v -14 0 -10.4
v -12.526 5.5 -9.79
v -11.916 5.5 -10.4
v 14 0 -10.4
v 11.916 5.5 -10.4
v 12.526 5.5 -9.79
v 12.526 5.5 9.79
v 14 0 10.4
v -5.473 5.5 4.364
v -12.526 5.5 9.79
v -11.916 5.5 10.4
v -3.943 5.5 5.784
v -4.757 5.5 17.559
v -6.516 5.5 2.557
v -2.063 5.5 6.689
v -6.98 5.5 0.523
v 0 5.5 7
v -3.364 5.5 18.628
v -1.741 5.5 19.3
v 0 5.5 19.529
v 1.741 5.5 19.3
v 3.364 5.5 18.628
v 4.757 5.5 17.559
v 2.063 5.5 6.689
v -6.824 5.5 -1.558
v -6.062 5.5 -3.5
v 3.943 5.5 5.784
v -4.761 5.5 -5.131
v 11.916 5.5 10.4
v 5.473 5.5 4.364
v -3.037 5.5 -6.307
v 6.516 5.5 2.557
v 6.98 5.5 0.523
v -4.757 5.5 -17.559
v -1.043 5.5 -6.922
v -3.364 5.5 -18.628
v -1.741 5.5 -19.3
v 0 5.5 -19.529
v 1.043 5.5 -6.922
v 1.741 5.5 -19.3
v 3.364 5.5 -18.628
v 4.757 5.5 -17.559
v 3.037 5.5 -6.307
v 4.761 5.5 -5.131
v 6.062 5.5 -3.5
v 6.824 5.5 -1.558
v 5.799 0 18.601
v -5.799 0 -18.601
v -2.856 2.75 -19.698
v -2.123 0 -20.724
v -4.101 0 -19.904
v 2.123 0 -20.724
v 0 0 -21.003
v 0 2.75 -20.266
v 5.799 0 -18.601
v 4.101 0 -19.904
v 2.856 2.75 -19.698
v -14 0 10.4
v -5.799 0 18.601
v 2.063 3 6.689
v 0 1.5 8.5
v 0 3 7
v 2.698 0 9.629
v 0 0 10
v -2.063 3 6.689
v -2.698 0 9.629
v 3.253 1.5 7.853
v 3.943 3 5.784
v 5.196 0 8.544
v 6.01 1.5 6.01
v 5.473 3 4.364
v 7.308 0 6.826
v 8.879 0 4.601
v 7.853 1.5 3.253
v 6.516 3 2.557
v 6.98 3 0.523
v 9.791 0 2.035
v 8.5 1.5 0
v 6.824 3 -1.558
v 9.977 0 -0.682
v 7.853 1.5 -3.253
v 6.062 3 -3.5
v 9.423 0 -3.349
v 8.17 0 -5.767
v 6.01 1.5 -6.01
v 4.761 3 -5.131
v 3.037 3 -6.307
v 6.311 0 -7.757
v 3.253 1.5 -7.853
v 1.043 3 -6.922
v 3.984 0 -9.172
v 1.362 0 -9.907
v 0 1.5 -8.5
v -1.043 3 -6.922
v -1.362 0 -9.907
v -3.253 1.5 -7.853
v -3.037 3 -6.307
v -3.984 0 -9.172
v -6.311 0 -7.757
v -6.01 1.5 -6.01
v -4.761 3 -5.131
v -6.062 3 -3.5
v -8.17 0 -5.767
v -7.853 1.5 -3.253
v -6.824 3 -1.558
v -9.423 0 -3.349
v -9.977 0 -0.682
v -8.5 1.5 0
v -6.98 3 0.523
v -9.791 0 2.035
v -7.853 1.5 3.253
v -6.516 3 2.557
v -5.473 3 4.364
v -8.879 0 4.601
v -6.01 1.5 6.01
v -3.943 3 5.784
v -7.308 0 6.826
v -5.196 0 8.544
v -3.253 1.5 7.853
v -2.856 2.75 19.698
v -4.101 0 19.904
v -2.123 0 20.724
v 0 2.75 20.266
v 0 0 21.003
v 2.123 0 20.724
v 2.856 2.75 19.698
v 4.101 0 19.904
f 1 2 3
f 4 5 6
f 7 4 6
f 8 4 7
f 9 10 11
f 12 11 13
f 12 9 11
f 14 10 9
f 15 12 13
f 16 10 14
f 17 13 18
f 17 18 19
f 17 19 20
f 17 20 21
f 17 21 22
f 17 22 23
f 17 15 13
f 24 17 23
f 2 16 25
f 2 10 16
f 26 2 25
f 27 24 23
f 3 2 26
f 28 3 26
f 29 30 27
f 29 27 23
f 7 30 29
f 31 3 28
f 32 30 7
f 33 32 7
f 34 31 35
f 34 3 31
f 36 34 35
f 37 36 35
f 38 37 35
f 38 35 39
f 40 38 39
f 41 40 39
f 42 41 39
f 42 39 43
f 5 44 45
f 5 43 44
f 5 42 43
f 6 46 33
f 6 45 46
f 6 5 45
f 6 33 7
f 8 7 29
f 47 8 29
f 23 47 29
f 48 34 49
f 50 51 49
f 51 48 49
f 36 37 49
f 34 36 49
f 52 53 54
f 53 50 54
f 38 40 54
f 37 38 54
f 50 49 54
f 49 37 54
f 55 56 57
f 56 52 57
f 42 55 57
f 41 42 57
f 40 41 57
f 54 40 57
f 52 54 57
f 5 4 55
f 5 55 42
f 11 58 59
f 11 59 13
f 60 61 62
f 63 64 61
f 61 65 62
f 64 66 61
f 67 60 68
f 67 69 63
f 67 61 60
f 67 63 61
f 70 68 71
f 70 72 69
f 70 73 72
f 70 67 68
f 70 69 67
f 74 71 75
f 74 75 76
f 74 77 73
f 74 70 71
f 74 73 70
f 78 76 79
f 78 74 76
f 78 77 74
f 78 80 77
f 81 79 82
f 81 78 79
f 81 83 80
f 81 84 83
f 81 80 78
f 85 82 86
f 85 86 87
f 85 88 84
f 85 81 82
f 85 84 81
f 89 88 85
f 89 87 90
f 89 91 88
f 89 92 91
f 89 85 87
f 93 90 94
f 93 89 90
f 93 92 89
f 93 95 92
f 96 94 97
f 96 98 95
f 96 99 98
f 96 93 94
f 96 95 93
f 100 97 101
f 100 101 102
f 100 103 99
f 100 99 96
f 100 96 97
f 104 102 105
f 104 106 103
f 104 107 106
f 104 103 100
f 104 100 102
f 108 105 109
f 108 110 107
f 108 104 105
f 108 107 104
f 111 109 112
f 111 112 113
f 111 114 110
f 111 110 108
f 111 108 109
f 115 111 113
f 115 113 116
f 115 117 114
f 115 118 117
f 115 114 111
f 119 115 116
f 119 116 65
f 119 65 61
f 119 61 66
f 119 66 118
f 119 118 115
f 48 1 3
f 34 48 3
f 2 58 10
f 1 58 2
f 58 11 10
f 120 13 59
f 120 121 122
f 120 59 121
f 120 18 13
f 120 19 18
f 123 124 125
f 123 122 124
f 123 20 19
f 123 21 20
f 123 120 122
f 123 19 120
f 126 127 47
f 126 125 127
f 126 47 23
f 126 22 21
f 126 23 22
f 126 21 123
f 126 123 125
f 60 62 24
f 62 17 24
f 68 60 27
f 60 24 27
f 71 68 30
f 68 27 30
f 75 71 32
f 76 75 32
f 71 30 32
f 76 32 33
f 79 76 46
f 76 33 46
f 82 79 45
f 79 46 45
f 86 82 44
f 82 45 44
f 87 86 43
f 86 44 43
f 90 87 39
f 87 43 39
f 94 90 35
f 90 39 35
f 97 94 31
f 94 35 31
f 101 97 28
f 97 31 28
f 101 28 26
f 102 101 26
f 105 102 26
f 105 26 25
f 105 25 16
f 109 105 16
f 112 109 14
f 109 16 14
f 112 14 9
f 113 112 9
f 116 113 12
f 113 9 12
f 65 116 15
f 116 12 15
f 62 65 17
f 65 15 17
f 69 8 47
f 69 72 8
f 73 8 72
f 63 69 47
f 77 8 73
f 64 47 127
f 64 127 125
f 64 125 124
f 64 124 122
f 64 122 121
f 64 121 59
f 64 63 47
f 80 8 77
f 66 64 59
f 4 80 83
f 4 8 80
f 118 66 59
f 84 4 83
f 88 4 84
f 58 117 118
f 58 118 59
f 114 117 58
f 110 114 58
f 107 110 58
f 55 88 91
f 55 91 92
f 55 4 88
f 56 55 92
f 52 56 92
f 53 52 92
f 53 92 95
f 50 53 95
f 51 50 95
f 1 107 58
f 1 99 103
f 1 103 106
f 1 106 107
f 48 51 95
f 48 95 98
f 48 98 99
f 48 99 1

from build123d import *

# Parameters (mm, degrees)
BOSS_EXTRUDE1_DEPTH                            = 5.5
DRAFT1_ANGLE                                   = -15
BOSS_EXTRUDE3_DEPTH                            = 5.5
SKETCH11_W                                     = 36
SKETCH11_H                                     = 45
BOSS_EXTRUDE4_DEPTH                            = 7
SKETCH12_R                                     = 1.65
CUT_EXTRUDE1_DEPTH                             = 10
CSK_FOR_M4_FLAT_HEAD_MACHINE_SCREW1_AT_2_COUNT = 2
CSK_FOR_M4_FLAT_HEAD_MACHINE_SCREW1_AT_2_PITCH = 26
CSK_FOR_M4_FLAT_HEAD_MACHINE_SCREW1_AT_3_COUNT = 2
CSK_FOR_M4_FLAT_HEAD_MACHINE_SCREW1_AT_3_PITCH = 35
CSK_FOR_M4_FLAT_HEAD_MACHINE_SCREW1_AT_4_COUNT = 2
CSK_FOR_M4_FLAT_HEAD_MACHINE_SCREW1_AT_4_PITCH = 43.600458713
FILLET1_R                                      = 5
CHAMFER1_SIZE                                  = 3
CUT_EXTRUDE2_DEPTH                             = 7


with BuildPart() as part:
    # Sketch1 → Boss-Extrude1 (new body)
    with BuildSketch(Plane(origin=(0, 0, 0), x_dir=(1, 0, 0), z_dir=(0, 1, 0))):
        Polygon((-5.798989873, -18.601010127), (-14, -10.4), (-14, 10.4), (-5.798989873, 18.601010127), (5.798989873, 18.601010127), (14, 10.4), (14, -10.4), (5.798989873, -18.601010127), align=None)
    extrude(amount=BOSS_EXTRUDE1_DEPTH)

    # Draft1
    draft1_faces = [part.faces().sort_by_distance(p)[0] for p in [
        (0, 2.75, 18.601010127),
        (-9.899494937, 2.75, 14.500505063),
        (-14, 2.75, 0),
        (9.899494937, 2.75, 14.500505063),
        (-9.899494937, 2.75, -14.500505063),
        (0, 2.75, -18.601010127),
        (9.899494937, 2.75, -14.500505063),
        (14, 2.75, 0),
    ]]
    draft(draft1_faces, Plane(origin=(0, 0, 0), x_dir=(0, 0, -1), z_dir=(0, -1, 0)), DRAFT1_ANGLE)

    # Sketch10 → Boss-Extrude3 (add)
    with BuildSketch(Plane.XZ):
        with BuildLine():
            Line((-14, -10.4), (14, -10.4))
            Line((14, -10.4), (5.798989873, -18.601010127))
            ThreePointArc((5.798989873, -18.601010127), (0, -21.00303038), (-5.798989873, -18.601010127))
            Line((-5.798989873, -18.601010127), (-14, -10.4))
        make_face()
        with BuildLine():
            Line((-14, 10.4), (14, 10.4))
            Line((14, 10.4), (5.798989873, 18.601010127))
            ThreePointArc((5.798989873, 18.601010127), (0, 21.00303038), (-5.798989873, 18.601010127))
            Line((-5.798989873, 18.601010127), (-14, 10.4))
        make_face()
    extrude(amount=-BOSS_EXTRUDE3_DEPTH)

    # Cut-Sweep1: sweep along a path in Sketch9
    with BuildLine(Plane.XZ) as cut_sweep1_path:
        Line((-20.807897552, -3.592102448), (-14, -10.4))
        Line((-14, -10.4), (-5.798989873, -18.601010127))
        ThreePointArc((-5.798989873, -18.601010127), (0, -21.00303038), (5.798989873, -18.601010127))
        Line((5.798989873, -18.601010127), (14, -10.4))
        Line((14, -10.4), (20.807897552, -3.592102448))
    # Sketch7 → Cut-Sweep1 (sweep, cut)
    with BuildSketch(Plane(origin=(14, 0, -10.4), x_dir=(-0.7071067811865477, 0, 0.7071067811865474), z_dir=(-0.7071067811865474, 0, -0.7071067811865477))):
        with BuildLine():
            Line((-3.263557389, 5.754), (1.376270031, 5.754))
            ThreePointArc((1.376270031, 5.754), (1.477025905, 5.704312701), (1.498942611, 5.594129981))
            Line((1.498942611, 5.594129981), (-0.159697719, -0.596))
            Line((-0.159697719, -0.596), (-3.263557389, -0.596))
            Line((-3.263557389, -0.596), (-3.263557389, 5.754))
        make_face()
    cut_sweep1 = sweep(path=cut_sweep1_path.line, mode=Mode.SUBTRACT)

    # Mirror1: Cut-Sweep1 across plane
    add(cut_sweep1.mirror(Plane.XY), mode=Mode.SUBTRACT)

    # Sketch11 → Boss-Extrude4 (add)
    with BuildSketch(Plane(origin=(0, 5.5, 0), x_dir=(1, 0, 0), z_dir=(0, 1, 0))):
        Rectangle(SKETCH11_W, SKETCH11_H)
    extrude(amount=BOSS_EXTRUDE4_DEPTH)

    # Sketch12 → Cut-Extrude1 (cut)
    with BuildSketch(Plane.XZ.offset(-5.5)):
        with Locations(Location((-13, 17.5, 0), (0, 0, 270))):
            Circle(SKETCH12_R)
        with Locations(Location((13, 17.5, 0), (0, 0, 90))):
            Circle(SKETCH12_R)
        with Locations(Location((13, -17.5, 0), (0, 0, 270))):
            Circle(SKETCH12_R)
        with Locations(Location((-13, -17.5, 0), (0, 0, 90))):
            Circle(SKETCH12_R)
    extrude(amount=-CUT_EXTRUDE1_DEPTH, mode=Mode.SUBTRACT)

    # Sketch3 → CSK for M4 Flat Head Machine Screw1 (revolve, cut)
    with BuildSketch(Plane(origin=(13, 5.5, -17.5), x_dir=(0, 0, -1), z_dir=(1, 0, 0))):
        Polygon((0, 0), (0, 4.351936393), (2.25, 3), (2.25, 2.45), (4.7, 0), align=None)
    csk_for_m4_flat_head_machine_screw1 = revolve(axis=Axis((13, -0.85, -17.5), (0, 1, 0)), mode=Mode.SUBTRACT)

    # CSK for M4 Flat Head Machine Screw1 at 2: CSK for M4 Flat Head Machine Screw1 ×2
    with Locations(*[(-i * CSK_FOR_M4_FLAT_HEAD_MACHINE_SCREW1_AT_2_PITCH, 0, 0) for i in range(1, CSK_FOR_M4_FLAT_HEAD_MACHINE_SCREW1_AT_2_COUNT)]):
        add(csk_for_m4_flat_head_machine_screw1, mode=Mode.SUBTRACT)

    # CSK for M4 Flat Head Machine Screw1 at 3: CSK for M4 Flat Head Machine Screw1 ×2
    with Locations(*[(0, 0, i * CSK_FOR_M4_FLAT_HEAD_MACHINE_SCREW1_AT_3_PITCH) for i in range(1, CSK_FOR_M4_FLAT_HEAD_MACHINE_SCREW1_AT_3_COUNT)]):
        add(csk_for_m4_flat_head_machine_screw1, mode=Mode.SUBTRACT)

    # CSK for M4 Flat Head Machine Screw1 at 4: CSK for M4 Flat Head Machine Screw1 ×2
    with Locations(*[Vector(-0.5963240013375937, 0, 0.8027438479544529) * (i * CSK_FOR_M4_FLAT_HEAD_MACHINE_SCREW1_AT_4_PITCH) for i in range(1, CSK_FOR_M4_FLAT_HEAD_MACHINE_SCREW1_AT_4_COUNT)]):
        add(csk_for_m4_flat_head_machine_screw1, mode=Mode.SUBTRACT)

    # Fillet1
    fillet1_edges = [part.edges().sort_by_distance(p)[0] for p in [
        (18, 9, 22.5),
        (18, 9, -22.5),
        (-18, 9, -22.5),
        (-18, 9, 22.5),
    ]]
    fillet(fillet1_edges, radius=FILLET1_R)

    # Sketch13 → Cut-Revolve1 (revolve, cut)
    with BuildSketch(Plane(origin=(0, 0, 0), x_dir=(0, 0, -1), z_dir=(1, 0, 0)), mode=Mode.PRIVATE) as cut_revolve1_sk:
        Polygon((0, 14.8), (0, -4.2), (7, -4.2), (7, 2.8), (7, 21.459689624), (0, 21.459689624), align=None)
    revolve(cut_revolve1_sk.sketch.rotate(Axis((0, -5.116386004, 0), (0, 1, 0)), 180), axis=Axis((0, -5.116386004, 0), (0, 1, 0)), mode=Mode.SUBTRACT)

    # Chamfer1
    chamfer1_edges = [part.edges().sort_by_distance(p)[0] for p in [
        (0, 0, -7),
    ]]
    chamfer(chamfer1_edges, length=CHAMFER1_SIZE)

    # Sketch14 → Cut-Extrude2 (cut)
    with BuildSketch(Plane(origin=(0, 12.5, 0), x_dir=(1, 0, 0), z_dir=(0, 1, 0))):
        with BuildLine():
            Line((18, -17.5), (18, 17.5))
            ThreePointArc((18, 17.5), (16.535533906, 21.035533906), (13, 22.5))
            Line((13, 22.5), (-13, 22.5))
            ThreePointArc((-13, 22.5), (-16.535533906, 21.035533906), (-18, 17.5))
            Line((-18, 17.5), (-18, -17.5))
            ThreePointArc((-18, -17.5), (-16.535533906, -21.035533906), (-13, -22.5))
            Line((-13, -22.5), (13, -22.5))
            ThreePointArc((13, -22.5), (16.535533906, -21.035533906), (18, -17.5))
        make_face()
    extrude(amount=-CUT_EXTRUDE2_DEPTH, mode=Mode.SUBTRACT)


solid = part.part
